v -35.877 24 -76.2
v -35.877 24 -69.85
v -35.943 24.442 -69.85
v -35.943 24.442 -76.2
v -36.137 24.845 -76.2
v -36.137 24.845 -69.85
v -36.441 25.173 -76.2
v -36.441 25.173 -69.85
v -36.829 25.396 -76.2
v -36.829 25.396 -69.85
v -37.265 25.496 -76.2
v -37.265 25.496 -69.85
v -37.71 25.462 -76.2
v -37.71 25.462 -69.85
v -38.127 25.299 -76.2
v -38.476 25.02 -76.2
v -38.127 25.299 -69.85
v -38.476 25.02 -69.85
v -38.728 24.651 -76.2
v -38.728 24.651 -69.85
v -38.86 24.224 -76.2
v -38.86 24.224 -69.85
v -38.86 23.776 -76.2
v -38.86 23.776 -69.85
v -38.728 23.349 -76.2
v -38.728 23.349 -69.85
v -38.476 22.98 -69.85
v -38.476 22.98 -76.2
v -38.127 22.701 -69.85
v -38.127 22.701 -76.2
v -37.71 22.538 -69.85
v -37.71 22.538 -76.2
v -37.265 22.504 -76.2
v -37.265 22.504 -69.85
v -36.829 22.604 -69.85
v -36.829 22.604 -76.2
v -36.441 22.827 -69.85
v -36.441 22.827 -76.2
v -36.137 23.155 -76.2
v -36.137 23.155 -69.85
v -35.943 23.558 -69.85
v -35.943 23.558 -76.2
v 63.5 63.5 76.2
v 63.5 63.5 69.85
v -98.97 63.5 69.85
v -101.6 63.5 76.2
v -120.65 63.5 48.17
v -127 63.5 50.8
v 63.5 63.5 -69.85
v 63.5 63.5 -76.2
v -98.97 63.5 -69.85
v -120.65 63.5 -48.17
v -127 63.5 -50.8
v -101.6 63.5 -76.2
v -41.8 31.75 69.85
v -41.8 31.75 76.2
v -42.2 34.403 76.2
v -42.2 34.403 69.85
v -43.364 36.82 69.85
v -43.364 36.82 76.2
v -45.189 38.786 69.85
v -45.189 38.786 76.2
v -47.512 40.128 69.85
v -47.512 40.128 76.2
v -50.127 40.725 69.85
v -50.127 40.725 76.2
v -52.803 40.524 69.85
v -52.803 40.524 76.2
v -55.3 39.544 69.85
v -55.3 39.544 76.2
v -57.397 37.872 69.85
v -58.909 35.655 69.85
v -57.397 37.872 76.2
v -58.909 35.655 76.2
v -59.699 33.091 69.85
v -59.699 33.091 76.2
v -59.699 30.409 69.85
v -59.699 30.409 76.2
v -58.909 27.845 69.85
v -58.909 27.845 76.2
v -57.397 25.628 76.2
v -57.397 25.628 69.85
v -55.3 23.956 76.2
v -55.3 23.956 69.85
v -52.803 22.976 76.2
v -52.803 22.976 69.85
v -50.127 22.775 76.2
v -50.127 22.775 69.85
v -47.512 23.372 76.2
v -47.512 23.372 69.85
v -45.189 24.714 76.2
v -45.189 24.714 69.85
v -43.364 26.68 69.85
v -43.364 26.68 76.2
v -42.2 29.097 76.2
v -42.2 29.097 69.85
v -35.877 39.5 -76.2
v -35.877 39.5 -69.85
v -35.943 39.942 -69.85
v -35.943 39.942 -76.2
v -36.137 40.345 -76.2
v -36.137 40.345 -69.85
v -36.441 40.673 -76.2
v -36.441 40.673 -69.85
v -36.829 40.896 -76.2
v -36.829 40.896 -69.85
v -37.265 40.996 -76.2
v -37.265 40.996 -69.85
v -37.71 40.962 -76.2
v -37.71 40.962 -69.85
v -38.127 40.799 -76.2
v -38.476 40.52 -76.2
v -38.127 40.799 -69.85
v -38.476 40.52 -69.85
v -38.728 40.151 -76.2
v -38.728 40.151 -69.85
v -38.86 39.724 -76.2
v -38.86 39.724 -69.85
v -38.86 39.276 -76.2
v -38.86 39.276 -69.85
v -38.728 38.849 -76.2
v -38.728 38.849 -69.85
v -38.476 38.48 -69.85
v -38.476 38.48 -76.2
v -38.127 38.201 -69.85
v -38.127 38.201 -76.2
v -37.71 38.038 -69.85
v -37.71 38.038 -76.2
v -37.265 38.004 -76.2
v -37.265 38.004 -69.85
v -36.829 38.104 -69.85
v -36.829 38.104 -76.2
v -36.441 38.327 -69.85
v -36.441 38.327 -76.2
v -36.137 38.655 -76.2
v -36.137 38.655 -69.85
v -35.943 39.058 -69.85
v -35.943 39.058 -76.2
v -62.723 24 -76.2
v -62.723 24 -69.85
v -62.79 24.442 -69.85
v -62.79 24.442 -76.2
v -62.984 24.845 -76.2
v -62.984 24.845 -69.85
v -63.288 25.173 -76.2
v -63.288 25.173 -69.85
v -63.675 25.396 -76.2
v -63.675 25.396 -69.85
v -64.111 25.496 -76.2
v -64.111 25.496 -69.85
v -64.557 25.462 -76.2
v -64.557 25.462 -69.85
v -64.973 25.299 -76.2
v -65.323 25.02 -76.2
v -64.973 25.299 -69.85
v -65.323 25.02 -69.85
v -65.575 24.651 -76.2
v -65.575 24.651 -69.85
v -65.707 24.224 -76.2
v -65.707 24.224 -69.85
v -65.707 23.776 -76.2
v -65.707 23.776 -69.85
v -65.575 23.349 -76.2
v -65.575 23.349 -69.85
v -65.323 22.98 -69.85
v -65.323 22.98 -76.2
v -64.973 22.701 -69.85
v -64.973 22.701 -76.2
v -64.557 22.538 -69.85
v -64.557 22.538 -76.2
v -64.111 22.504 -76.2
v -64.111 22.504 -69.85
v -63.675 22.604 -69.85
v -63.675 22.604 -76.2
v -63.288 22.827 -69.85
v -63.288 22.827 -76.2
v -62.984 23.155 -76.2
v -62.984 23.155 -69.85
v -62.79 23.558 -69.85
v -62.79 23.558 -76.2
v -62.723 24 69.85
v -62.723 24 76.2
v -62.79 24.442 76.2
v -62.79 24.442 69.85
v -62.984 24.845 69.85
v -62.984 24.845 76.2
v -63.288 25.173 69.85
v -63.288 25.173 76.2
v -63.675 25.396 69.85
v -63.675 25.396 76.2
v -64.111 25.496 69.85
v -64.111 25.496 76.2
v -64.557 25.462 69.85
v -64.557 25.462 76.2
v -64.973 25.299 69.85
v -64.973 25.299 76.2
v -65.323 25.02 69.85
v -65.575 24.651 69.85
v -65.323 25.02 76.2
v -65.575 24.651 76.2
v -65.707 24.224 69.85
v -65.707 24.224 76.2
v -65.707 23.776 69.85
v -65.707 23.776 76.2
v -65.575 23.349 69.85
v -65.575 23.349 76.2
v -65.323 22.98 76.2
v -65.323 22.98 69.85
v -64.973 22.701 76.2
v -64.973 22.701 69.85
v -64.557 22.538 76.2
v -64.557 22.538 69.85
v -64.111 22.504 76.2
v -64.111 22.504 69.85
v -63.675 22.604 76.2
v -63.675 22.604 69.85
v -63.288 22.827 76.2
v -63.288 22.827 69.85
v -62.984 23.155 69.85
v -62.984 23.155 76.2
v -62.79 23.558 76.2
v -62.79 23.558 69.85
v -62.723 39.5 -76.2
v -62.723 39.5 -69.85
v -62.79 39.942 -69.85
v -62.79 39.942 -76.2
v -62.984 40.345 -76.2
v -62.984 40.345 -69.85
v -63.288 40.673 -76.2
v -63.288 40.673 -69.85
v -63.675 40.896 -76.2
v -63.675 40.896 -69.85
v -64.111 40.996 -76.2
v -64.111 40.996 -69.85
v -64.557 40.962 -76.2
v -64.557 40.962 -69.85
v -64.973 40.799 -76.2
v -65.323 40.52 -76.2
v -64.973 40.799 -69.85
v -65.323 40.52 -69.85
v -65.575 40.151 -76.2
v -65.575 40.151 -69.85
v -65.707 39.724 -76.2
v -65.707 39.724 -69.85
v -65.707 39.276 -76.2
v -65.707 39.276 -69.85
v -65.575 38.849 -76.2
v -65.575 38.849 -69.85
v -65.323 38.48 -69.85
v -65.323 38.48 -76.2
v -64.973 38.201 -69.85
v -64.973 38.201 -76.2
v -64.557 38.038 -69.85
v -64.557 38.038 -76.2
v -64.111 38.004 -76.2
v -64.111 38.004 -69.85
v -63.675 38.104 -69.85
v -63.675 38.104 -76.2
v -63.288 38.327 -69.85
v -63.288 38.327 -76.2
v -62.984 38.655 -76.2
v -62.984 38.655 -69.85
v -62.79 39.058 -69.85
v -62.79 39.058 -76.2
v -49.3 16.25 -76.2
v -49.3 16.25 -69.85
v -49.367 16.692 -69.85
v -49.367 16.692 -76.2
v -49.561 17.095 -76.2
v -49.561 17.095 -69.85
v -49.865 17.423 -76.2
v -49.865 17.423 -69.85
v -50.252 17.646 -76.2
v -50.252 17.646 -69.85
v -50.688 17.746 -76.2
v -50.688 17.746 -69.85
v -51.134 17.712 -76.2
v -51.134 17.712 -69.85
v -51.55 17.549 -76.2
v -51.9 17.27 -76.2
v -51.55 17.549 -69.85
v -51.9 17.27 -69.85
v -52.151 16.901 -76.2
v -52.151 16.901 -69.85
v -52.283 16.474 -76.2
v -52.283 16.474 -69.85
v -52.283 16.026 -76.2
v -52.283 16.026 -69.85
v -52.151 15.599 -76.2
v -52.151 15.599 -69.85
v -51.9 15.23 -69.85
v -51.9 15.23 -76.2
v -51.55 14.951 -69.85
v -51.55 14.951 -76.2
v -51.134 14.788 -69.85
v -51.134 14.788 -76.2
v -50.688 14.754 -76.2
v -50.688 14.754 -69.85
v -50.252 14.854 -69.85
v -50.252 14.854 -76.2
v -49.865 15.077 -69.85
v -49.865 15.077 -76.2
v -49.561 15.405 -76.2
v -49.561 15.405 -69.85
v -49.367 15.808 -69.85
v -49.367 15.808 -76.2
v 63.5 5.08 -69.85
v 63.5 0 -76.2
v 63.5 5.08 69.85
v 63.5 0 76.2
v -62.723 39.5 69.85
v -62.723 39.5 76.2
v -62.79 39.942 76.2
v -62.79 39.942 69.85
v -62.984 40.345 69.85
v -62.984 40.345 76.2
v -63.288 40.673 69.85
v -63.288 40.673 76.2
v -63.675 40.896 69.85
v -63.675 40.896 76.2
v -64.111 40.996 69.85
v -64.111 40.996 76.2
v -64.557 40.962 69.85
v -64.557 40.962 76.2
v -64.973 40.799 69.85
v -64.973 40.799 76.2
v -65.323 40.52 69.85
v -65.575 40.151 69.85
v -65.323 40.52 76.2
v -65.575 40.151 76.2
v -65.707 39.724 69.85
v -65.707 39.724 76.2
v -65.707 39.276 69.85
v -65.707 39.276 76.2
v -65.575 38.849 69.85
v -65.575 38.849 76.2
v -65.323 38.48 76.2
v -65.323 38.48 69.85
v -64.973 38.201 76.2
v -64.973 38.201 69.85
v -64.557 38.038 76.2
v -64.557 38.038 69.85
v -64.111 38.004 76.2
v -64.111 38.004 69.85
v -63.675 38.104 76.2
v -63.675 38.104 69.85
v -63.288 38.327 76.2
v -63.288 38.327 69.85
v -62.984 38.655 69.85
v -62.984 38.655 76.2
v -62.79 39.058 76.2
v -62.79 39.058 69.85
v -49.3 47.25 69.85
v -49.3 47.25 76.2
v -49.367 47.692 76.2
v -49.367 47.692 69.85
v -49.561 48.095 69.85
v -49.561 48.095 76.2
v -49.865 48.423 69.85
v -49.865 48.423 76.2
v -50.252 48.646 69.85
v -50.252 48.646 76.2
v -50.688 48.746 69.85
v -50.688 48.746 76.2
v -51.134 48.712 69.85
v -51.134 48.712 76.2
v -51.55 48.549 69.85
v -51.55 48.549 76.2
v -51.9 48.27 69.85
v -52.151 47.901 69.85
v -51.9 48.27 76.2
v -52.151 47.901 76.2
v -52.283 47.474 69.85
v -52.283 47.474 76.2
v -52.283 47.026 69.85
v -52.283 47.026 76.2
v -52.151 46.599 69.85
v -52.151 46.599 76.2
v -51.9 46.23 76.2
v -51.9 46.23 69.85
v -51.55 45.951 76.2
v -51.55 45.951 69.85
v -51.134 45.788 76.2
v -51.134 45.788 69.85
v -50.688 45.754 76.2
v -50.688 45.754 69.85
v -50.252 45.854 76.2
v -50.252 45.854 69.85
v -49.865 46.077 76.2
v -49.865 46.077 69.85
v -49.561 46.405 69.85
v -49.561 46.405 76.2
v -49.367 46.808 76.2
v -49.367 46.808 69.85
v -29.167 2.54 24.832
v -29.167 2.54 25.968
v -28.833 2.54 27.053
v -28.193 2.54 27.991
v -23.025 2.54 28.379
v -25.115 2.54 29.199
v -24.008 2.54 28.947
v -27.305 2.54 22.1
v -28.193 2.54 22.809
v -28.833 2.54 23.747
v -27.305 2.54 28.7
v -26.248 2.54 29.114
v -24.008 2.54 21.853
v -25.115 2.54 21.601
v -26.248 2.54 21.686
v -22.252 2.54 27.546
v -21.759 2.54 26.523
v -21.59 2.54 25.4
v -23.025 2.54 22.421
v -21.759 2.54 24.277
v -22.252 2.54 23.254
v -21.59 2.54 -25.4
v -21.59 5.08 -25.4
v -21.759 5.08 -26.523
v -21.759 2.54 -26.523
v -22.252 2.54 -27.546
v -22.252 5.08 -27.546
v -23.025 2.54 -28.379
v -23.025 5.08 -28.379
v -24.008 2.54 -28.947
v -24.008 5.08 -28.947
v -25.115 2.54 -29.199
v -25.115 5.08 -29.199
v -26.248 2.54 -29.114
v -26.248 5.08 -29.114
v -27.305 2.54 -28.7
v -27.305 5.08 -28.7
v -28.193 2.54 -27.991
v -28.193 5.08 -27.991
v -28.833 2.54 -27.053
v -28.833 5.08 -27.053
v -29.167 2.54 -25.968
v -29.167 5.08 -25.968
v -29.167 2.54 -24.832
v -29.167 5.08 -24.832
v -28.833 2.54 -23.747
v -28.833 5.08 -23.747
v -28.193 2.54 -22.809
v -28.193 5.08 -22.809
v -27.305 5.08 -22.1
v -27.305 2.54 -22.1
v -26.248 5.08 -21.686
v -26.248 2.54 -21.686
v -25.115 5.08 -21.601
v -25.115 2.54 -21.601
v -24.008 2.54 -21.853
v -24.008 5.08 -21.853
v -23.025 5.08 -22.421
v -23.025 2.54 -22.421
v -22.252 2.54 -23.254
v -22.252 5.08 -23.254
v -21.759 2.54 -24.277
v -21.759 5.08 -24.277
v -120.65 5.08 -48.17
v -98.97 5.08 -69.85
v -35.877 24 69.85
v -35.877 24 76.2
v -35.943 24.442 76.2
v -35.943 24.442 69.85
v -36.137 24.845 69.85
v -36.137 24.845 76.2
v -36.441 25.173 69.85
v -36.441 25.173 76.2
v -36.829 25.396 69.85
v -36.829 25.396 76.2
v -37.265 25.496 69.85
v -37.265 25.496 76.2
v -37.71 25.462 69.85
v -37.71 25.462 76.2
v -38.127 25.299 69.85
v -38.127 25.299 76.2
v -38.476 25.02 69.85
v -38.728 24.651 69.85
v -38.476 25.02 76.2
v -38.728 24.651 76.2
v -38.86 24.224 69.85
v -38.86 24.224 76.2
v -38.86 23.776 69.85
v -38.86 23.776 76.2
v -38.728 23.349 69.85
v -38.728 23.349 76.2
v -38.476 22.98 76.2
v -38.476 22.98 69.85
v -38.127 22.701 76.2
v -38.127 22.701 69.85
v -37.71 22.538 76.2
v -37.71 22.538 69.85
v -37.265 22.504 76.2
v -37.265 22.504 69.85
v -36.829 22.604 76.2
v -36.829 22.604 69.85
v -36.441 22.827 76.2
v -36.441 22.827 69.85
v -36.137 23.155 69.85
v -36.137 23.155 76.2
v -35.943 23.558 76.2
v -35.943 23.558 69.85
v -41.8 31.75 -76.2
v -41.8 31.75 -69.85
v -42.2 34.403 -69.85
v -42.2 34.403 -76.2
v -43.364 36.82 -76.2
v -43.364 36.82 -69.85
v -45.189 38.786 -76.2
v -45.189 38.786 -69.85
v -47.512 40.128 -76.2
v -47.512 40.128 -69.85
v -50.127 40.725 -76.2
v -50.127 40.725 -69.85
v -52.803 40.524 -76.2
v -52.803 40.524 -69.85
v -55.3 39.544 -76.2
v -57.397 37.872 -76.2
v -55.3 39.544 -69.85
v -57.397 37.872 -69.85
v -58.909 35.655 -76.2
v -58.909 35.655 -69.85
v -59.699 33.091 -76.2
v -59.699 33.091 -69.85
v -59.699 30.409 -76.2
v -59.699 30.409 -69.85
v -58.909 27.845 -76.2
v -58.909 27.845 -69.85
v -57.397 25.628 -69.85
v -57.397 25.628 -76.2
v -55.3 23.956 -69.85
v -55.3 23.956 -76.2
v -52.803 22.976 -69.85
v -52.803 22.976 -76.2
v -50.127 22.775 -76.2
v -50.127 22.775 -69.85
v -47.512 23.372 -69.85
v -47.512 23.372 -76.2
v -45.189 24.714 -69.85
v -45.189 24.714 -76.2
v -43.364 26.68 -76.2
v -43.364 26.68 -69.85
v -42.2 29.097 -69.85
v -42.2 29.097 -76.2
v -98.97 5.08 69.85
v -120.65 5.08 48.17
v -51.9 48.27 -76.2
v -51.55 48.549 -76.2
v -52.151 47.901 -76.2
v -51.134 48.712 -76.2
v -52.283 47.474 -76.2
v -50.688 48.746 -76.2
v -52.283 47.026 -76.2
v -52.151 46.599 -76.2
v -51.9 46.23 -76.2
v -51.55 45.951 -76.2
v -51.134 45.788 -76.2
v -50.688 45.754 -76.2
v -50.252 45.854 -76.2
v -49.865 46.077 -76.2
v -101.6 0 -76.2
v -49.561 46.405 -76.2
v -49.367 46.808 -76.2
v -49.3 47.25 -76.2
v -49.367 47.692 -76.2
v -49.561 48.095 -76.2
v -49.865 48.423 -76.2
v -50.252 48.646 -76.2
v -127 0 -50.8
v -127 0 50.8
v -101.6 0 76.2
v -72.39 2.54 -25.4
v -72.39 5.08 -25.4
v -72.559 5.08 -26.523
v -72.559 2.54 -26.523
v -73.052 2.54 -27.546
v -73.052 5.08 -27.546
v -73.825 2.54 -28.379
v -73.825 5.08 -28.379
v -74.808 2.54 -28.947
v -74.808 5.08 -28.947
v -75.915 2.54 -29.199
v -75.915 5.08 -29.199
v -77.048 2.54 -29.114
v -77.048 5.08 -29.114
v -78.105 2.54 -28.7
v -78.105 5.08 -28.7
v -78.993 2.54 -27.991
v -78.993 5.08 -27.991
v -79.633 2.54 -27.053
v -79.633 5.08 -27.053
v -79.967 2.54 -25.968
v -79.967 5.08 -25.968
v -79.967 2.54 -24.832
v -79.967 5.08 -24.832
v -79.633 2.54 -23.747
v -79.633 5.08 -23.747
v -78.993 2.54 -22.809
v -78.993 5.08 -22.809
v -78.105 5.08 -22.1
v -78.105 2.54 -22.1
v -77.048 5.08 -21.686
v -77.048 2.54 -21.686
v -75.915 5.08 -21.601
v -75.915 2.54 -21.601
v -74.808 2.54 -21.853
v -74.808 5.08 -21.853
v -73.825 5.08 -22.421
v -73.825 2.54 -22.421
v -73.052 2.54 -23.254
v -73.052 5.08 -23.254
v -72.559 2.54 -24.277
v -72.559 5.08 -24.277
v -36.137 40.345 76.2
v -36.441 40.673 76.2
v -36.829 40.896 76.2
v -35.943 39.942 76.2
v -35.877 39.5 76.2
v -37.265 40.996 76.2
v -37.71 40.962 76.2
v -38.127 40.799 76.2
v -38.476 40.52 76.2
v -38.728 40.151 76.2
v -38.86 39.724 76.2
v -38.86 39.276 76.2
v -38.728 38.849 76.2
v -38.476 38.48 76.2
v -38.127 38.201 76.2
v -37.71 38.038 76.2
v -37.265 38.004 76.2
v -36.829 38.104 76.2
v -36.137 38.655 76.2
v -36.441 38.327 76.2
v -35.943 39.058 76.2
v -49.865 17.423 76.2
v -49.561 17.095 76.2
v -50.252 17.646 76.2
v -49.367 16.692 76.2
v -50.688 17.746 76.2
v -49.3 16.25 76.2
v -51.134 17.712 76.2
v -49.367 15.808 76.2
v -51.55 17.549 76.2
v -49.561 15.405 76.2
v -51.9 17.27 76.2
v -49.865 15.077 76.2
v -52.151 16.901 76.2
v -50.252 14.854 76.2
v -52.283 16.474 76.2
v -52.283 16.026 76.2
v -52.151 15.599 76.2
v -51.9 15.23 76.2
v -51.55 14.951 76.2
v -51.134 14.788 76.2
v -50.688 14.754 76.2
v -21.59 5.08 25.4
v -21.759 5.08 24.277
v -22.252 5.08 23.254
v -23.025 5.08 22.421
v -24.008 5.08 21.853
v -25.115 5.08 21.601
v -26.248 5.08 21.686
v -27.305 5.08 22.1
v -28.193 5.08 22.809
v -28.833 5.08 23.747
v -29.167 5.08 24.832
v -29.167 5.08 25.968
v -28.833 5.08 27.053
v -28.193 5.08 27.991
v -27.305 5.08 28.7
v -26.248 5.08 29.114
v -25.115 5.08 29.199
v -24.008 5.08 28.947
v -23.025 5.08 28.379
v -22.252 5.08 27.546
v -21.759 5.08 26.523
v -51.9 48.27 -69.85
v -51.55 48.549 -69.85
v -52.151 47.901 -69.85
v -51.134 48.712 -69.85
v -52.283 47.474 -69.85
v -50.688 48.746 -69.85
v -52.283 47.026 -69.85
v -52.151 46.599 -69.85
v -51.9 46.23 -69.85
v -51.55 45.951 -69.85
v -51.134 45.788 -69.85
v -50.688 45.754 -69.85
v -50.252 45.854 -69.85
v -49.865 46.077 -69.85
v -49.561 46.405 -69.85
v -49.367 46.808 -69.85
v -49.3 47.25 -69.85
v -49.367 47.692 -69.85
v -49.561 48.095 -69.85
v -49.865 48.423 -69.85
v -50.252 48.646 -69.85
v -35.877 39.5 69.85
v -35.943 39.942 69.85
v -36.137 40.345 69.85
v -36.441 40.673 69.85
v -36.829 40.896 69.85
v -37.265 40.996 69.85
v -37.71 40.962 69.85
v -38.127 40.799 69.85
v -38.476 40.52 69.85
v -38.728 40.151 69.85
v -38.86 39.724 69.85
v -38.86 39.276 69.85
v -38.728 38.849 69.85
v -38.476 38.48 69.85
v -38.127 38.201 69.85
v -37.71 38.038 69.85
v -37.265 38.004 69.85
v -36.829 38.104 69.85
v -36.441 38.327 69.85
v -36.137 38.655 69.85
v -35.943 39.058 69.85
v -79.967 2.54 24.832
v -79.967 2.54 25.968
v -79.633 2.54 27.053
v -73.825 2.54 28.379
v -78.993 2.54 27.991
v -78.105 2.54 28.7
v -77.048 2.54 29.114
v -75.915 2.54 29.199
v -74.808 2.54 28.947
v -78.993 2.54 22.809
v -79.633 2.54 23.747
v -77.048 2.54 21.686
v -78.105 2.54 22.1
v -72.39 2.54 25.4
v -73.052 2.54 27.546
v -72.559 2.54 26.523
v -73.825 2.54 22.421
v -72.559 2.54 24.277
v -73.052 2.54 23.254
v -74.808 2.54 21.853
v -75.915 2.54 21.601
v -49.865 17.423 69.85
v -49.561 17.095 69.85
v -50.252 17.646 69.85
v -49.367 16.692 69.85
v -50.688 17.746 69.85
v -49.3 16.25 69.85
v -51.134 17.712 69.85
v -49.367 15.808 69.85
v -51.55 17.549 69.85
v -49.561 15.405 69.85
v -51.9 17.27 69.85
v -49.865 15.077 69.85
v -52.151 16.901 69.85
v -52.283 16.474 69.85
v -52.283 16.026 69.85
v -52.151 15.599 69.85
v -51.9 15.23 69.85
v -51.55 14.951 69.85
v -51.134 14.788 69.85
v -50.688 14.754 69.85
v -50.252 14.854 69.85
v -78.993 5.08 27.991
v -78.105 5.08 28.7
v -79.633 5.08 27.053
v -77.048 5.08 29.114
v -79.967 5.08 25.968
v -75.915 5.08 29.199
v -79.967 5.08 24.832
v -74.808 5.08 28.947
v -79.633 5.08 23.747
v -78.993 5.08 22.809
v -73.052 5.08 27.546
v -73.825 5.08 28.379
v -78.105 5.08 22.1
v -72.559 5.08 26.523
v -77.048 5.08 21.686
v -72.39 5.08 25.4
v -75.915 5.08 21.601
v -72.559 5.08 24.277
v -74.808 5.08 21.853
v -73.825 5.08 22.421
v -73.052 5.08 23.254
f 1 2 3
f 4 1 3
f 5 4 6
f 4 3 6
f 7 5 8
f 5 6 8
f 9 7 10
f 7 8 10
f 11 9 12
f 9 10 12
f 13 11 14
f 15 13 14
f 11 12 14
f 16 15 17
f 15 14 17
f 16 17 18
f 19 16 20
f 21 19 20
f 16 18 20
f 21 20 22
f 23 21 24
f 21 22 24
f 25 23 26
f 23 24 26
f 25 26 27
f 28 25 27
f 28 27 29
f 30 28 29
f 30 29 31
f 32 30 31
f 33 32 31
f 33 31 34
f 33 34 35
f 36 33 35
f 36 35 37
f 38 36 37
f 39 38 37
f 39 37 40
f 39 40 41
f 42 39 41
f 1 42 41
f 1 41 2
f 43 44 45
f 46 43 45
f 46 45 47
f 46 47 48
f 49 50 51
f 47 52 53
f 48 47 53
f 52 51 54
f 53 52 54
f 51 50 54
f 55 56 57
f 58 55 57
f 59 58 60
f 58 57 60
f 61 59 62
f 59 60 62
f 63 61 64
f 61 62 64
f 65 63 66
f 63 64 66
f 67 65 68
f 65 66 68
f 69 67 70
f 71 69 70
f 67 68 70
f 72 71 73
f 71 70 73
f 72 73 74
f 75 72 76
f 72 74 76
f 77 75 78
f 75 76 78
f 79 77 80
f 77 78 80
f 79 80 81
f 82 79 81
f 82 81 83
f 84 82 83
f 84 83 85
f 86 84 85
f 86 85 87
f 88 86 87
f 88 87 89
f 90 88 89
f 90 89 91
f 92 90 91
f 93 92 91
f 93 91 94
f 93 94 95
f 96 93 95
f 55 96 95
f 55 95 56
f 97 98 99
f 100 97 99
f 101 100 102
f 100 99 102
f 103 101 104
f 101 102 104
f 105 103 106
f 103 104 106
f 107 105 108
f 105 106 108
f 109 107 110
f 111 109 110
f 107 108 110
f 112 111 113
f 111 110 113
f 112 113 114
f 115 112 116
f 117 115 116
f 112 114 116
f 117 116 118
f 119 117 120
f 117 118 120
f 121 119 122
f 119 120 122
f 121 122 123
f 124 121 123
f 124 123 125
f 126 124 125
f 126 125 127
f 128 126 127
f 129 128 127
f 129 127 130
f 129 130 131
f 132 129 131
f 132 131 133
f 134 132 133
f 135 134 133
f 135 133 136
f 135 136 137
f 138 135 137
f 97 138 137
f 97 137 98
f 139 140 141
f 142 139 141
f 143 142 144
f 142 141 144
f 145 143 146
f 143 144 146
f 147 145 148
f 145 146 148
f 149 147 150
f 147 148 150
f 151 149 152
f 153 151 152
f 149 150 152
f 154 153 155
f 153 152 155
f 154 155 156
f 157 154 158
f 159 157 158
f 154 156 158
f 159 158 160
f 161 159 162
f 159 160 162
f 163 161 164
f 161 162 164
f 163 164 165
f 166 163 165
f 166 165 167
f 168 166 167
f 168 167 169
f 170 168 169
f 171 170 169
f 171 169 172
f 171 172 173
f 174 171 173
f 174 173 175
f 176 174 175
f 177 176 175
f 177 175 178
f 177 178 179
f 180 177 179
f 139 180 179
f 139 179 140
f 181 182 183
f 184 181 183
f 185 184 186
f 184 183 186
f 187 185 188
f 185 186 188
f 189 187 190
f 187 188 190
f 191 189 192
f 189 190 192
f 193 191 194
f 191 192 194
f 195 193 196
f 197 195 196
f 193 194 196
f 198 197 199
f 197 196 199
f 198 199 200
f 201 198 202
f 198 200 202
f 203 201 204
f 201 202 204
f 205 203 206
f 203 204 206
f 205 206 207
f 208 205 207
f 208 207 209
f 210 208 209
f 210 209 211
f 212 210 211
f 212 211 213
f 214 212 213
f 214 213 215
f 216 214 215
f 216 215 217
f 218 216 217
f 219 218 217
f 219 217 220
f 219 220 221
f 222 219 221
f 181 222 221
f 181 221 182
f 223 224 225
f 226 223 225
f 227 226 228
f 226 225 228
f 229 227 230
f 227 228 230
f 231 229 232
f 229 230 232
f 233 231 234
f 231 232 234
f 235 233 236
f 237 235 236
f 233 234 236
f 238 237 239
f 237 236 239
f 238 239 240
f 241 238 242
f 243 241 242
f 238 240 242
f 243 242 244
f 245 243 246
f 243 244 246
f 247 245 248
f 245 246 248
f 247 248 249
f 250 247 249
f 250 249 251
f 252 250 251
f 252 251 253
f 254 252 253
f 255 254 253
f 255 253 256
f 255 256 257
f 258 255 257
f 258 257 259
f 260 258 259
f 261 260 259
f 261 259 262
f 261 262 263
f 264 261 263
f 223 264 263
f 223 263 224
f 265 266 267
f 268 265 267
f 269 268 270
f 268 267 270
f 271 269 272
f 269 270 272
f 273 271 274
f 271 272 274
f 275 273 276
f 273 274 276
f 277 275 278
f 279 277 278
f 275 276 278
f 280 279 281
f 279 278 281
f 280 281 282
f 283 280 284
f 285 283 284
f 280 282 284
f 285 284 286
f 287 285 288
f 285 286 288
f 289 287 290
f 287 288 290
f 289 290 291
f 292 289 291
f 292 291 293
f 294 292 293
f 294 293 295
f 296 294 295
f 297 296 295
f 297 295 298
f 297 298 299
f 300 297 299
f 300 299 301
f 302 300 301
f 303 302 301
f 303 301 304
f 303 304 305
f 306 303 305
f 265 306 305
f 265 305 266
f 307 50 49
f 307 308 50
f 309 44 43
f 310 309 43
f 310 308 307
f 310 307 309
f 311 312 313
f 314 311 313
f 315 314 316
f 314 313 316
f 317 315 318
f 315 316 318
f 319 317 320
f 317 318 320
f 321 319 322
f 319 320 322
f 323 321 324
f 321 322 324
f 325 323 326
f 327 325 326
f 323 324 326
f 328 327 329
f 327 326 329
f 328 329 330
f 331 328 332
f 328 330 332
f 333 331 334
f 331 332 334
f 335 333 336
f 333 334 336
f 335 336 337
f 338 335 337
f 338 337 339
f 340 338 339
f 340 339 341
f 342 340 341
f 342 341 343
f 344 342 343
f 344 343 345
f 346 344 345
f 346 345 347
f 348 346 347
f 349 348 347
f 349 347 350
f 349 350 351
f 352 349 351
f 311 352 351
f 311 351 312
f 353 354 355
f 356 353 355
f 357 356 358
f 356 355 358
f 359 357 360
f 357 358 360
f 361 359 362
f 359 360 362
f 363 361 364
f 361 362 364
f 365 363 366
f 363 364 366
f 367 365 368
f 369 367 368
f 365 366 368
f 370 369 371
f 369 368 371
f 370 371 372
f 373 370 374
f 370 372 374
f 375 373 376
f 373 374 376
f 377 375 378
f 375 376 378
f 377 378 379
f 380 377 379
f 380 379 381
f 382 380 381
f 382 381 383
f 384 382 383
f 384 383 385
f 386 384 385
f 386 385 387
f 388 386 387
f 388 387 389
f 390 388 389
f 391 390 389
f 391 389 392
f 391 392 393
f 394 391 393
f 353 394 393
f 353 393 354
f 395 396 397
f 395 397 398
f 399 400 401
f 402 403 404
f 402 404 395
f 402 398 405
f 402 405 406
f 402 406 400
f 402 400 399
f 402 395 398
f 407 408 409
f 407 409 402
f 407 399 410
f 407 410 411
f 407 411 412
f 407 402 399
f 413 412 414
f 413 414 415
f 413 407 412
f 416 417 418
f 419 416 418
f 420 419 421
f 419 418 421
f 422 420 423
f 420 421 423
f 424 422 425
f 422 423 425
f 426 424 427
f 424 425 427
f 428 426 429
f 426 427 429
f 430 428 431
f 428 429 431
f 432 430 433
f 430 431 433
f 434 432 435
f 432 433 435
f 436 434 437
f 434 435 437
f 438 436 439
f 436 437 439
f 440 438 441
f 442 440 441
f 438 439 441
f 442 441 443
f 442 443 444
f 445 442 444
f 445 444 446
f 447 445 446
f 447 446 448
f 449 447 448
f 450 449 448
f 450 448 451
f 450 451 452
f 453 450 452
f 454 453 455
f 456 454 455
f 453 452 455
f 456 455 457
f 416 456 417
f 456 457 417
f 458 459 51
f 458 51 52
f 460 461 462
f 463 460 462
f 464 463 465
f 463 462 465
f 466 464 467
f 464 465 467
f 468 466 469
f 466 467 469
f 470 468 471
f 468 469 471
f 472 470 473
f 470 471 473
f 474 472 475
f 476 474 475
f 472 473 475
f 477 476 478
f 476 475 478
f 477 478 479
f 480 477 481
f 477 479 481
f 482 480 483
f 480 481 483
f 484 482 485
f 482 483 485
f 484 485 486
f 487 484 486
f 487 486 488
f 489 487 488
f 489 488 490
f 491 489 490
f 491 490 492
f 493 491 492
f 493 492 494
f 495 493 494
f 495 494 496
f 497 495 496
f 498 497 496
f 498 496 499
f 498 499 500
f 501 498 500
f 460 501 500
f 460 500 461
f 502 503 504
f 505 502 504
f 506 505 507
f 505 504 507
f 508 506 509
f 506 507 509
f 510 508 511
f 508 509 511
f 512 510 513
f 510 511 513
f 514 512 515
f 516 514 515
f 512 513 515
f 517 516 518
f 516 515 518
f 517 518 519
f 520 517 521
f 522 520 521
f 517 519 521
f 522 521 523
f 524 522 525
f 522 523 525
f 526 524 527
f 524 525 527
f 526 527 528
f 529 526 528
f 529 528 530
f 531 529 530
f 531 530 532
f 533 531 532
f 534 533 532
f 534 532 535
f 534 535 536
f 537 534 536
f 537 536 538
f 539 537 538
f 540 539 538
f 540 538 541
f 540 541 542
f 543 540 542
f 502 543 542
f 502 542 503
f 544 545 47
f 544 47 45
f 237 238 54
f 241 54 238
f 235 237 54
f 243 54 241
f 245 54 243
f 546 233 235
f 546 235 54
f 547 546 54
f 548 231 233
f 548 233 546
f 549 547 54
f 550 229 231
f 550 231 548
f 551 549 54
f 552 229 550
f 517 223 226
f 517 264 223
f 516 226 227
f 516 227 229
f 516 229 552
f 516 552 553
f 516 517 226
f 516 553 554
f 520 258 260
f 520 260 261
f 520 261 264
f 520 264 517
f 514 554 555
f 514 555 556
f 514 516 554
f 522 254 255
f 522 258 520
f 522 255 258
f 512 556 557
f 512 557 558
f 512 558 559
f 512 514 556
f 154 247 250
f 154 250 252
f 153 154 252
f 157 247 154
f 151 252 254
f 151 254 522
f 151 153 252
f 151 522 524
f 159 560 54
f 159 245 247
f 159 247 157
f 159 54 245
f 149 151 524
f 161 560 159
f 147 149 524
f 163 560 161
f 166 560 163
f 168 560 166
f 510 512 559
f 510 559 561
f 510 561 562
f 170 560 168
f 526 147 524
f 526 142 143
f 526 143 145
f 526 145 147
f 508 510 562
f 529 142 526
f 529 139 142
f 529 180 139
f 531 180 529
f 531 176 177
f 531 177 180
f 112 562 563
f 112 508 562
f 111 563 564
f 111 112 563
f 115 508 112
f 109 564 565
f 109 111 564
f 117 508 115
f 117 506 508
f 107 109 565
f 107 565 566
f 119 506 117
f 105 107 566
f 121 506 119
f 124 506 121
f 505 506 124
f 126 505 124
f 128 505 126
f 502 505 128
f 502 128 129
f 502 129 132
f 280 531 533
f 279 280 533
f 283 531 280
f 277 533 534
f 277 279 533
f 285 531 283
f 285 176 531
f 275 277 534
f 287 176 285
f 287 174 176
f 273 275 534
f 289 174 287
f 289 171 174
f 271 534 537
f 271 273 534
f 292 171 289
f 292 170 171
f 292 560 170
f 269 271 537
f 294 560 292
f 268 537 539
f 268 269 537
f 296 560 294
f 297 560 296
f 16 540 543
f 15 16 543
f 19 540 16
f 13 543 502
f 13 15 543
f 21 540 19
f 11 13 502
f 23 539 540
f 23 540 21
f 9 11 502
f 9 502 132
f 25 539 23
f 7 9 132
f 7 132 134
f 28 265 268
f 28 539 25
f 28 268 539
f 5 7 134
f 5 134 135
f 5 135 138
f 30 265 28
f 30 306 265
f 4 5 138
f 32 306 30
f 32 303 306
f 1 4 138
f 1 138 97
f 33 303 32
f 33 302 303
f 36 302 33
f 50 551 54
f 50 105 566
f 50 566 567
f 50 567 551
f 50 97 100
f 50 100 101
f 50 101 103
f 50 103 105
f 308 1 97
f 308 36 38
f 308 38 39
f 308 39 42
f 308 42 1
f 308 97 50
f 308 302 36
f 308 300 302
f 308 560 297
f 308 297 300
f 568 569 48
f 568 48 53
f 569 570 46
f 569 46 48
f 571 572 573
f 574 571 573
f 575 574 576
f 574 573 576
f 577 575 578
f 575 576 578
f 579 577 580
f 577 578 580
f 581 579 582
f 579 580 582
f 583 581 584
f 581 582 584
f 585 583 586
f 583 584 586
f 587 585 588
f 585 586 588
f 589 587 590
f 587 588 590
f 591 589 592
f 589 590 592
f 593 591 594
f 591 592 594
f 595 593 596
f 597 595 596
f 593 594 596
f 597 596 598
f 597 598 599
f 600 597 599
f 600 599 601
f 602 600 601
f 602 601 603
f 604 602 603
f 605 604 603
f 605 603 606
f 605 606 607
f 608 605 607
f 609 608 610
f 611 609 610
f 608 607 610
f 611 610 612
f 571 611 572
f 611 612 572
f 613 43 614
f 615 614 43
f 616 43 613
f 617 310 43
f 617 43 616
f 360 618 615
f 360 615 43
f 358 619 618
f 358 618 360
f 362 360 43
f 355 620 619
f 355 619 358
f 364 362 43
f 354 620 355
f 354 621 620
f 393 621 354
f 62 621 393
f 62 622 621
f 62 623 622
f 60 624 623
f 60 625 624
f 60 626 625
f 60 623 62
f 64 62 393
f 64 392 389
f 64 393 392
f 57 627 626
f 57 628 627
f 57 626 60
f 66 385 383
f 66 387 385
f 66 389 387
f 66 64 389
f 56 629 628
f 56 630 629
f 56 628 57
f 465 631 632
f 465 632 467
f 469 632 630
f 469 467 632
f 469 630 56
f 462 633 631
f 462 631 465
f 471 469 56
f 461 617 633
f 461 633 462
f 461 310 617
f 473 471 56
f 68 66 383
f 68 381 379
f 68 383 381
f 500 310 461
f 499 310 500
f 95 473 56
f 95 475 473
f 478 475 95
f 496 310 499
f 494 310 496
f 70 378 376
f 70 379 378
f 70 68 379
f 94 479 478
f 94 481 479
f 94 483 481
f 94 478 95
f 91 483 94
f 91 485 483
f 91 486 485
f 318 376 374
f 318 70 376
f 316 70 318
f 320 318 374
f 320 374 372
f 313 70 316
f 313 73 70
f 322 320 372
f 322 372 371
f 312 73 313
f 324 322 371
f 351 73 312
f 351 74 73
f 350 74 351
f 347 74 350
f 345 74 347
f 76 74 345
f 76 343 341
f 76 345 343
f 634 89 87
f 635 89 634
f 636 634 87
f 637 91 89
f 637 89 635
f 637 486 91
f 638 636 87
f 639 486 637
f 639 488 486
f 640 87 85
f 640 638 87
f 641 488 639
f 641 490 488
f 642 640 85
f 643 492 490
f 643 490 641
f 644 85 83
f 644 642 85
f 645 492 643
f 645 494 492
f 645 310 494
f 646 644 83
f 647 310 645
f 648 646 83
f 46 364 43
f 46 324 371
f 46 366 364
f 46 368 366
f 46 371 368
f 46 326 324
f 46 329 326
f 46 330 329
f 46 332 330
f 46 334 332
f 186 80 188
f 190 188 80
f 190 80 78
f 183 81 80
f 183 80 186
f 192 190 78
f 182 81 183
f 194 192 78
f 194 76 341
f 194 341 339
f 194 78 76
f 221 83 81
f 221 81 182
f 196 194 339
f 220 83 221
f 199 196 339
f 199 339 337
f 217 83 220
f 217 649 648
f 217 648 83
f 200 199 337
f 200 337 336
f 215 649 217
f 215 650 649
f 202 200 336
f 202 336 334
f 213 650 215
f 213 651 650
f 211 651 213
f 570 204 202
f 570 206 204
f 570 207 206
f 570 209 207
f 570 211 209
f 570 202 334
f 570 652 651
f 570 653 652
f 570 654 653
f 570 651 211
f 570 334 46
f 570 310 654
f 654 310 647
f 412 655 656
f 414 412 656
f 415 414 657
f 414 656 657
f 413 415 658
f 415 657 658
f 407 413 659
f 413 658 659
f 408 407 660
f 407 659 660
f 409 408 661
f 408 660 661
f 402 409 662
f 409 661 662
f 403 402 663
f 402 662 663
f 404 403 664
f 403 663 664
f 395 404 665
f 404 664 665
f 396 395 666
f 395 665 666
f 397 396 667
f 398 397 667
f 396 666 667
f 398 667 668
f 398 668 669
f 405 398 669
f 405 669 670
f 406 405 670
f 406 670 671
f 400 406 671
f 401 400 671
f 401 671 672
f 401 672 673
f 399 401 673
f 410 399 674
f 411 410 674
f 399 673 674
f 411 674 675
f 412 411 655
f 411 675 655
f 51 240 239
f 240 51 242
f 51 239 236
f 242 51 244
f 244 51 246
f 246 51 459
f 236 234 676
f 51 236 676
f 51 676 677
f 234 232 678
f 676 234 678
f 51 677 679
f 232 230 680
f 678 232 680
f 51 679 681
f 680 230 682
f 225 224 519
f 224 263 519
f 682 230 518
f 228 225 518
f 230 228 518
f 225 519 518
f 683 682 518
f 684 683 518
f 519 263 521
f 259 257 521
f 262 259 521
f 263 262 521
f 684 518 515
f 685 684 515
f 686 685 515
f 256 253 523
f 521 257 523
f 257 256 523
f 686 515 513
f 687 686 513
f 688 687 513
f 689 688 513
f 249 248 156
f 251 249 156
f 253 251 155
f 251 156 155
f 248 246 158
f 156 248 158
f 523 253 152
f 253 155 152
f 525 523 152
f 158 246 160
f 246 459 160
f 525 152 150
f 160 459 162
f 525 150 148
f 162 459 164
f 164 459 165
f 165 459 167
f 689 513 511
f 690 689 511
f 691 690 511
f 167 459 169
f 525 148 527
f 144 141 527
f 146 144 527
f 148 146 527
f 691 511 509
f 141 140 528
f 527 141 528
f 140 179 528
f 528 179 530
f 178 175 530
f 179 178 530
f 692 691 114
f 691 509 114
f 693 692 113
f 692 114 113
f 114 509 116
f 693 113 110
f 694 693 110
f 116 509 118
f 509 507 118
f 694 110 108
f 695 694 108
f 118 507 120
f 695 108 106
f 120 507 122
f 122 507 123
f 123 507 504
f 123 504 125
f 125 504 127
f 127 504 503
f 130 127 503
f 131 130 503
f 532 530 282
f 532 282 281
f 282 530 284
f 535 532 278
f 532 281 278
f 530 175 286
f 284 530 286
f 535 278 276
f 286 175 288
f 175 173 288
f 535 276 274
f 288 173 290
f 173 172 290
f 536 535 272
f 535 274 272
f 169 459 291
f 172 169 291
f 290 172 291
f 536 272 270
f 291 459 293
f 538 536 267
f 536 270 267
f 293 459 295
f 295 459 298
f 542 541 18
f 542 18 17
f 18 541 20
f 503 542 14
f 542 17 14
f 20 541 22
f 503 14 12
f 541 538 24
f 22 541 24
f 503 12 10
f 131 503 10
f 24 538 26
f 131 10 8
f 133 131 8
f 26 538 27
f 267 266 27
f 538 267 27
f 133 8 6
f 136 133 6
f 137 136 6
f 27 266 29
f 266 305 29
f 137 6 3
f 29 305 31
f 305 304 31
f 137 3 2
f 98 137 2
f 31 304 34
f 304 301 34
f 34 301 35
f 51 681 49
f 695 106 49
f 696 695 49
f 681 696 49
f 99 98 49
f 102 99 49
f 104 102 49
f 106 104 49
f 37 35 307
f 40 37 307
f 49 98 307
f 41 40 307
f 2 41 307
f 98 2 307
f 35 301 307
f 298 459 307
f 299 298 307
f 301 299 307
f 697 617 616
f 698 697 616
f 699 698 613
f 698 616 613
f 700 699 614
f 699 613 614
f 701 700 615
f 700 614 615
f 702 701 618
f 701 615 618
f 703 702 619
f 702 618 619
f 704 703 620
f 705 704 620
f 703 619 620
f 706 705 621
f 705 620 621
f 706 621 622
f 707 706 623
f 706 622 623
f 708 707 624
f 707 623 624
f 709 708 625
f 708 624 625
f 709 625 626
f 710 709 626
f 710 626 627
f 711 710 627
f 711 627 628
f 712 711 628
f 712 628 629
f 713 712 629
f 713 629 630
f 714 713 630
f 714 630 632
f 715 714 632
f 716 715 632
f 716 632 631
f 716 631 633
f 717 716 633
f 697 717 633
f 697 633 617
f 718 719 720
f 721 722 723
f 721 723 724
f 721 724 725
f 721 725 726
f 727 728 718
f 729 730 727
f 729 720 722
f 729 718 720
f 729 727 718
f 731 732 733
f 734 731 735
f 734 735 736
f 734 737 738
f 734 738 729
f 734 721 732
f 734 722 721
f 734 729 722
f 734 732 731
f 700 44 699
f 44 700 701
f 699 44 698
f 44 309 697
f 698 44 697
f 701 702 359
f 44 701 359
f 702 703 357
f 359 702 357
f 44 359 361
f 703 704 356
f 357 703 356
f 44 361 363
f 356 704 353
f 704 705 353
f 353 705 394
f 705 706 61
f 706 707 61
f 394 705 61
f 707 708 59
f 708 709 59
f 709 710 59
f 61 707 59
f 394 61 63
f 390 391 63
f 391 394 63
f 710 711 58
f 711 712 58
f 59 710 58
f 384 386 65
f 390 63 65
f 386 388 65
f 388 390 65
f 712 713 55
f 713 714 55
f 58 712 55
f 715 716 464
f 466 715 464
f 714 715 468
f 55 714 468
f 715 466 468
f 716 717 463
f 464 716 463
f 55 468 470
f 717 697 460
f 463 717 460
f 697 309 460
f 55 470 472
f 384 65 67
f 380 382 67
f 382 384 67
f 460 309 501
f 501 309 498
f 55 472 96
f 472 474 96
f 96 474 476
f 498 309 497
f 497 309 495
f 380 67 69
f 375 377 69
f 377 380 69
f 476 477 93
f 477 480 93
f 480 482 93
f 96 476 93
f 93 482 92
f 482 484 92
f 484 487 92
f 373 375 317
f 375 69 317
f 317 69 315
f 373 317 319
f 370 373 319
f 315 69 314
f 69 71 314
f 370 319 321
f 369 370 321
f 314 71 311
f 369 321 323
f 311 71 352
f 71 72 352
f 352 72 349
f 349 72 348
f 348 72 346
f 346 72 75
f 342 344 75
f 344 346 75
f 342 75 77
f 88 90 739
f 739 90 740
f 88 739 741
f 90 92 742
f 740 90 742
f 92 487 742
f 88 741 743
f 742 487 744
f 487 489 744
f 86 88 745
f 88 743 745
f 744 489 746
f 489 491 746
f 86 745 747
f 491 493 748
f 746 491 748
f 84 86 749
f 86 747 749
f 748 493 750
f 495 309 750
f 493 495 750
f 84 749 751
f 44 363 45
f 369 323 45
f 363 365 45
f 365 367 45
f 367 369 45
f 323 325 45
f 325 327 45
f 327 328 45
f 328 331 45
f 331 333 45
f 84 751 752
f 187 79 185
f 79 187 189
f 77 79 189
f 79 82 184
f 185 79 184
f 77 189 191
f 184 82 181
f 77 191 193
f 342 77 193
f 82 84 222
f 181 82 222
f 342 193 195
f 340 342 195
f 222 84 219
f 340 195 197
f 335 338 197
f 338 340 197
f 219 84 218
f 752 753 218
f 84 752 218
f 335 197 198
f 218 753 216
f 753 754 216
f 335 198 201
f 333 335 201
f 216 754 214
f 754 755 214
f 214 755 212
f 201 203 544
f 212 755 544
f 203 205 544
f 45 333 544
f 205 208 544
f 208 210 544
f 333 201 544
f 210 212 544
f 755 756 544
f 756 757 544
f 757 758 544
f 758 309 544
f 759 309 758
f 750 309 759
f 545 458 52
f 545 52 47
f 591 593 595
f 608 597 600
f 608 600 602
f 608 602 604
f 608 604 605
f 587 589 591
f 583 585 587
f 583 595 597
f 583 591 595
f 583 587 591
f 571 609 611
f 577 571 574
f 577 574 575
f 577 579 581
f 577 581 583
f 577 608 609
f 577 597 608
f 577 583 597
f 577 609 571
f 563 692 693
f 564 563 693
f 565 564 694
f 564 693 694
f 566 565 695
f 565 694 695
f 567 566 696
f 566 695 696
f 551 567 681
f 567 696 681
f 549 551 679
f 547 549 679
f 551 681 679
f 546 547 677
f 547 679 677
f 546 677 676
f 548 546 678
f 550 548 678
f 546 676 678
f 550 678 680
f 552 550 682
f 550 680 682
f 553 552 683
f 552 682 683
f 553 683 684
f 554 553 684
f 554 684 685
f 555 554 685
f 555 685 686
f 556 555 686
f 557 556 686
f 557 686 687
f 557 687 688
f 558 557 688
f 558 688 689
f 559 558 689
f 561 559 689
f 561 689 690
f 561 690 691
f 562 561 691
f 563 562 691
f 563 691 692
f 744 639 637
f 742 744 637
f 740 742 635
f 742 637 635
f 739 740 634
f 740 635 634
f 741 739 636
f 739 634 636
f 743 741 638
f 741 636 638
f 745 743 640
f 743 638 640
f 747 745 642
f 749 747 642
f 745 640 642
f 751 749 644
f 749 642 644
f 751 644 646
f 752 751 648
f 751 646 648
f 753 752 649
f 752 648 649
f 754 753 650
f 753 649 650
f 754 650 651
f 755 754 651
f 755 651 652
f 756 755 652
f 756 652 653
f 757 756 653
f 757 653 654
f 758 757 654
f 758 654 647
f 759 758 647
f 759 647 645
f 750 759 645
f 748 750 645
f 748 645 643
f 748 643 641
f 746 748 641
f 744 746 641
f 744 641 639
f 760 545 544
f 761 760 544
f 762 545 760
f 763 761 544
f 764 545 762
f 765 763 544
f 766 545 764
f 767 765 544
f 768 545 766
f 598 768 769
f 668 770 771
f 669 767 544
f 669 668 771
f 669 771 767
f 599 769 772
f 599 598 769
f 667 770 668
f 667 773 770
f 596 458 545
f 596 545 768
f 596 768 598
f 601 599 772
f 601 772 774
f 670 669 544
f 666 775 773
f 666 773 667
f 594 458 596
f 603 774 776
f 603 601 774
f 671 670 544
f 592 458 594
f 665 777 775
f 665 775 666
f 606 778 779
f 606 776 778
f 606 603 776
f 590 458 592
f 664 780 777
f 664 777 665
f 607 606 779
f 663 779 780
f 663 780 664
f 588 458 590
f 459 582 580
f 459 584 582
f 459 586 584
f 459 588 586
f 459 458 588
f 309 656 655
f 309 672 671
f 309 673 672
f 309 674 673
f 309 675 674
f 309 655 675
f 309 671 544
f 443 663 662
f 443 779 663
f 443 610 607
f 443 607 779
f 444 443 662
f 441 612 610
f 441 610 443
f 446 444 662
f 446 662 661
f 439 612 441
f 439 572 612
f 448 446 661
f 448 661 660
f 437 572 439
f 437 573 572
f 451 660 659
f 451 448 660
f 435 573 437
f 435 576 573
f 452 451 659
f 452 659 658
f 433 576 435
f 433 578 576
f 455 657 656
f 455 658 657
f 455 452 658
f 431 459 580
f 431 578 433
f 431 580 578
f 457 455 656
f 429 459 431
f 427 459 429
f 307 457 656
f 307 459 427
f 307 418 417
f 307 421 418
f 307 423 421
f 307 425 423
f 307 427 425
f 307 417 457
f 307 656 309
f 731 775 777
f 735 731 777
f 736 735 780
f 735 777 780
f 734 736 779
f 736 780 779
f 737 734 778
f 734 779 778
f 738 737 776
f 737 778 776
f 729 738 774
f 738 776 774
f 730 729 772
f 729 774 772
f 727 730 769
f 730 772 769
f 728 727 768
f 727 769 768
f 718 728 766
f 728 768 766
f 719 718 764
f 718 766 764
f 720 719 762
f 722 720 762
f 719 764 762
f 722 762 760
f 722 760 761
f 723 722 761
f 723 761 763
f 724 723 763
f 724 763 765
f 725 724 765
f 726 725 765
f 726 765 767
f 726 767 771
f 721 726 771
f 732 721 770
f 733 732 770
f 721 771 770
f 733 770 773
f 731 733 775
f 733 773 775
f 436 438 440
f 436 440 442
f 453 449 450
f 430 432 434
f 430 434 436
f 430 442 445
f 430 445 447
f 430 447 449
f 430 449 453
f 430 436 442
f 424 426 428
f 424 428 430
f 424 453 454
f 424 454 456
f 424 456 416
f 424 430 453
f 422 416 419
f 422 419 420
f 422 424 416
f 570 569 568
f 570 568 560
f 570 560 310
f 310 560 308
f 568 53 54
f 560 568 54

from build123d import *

# Parameters (mm, degrees)
SKETCH2_W           = 190.5
SKETCH2_H           = 152.4
BOSS_EXTRUDE1_DEPTH = 5.08
CHAMFER1_SIZE       = 25.4
BOSS_EXTRUDE3_DEPTH = 58.42
SKETCH5_R           = 9
SKETCH5_R_2         = 1.5
CUT_EXTRUDE1_DEPTH  = 153.4
SKETCH7_R           = 3.81
CUT_EXTRUDE2_DEPTH  = 2.54


with BuildPart() as part:
    # Sketch2 → Boss-Extrude1 (new body)
    with BuildSketch(Plane(origin=(0, 0, 0), x_dir=(1, 0, 0), z_dir=(0, 1, 0))):
        with Locations((-31.75, 0)):
            Rectangle(SKETCH2_W, SKETCH2_H)
    extrude(amount=BOSS_EXTRUDE1_DEPTH)

    # Chamfer1
    chamfer1_edges = [part.edges().sort_by_distance(p)[0] for p in [
        (-127, 2.54, -76.2),
        (-127, 2.54, 76.2),
    ]]
    chamfer(chamfer1_edges, length=CHAMFER1_SIZE)

    # Sketch4 → Boss-Extrude3 (add)
    with BuildSketch(Plane(origin=(0, 5.08, 0), x_dir=(1, 0, 0), z_dir=(0, 1, 0))):
        Polygon((57.15, 69.85), (-98.969743879, 69.85), (-120.65, 48.169743879), (-120.65, -48.169743879), (-98.969743879, -69.85), (57.15, -69.85), (63.5, -69.85), (63.5, -76.2), (-101.6, -76.2), (-127, -50.8), (-127, 50.8), (-101.6, 76.2), (63.5, 76.2), (63.5, 69.85), align=None)
    extrude(amount=BOSS_EXTRUDE3_DEPTH)

    # Sketch5 → Cut-Extrude1 (cut, through all)
    with BuildSketch(Plane.XY.offset(76.2)):
        with Locations((-50.8, 31.75)):
            Circle(SKETCH5_R)
        with Locations((-50.8, 47.25)):
            Circle(SKETCH5_R_2)
        with Locations((-37.376606241, 39.5)):
            Circle(SKETCH5_R_2)
        with Locations((-37.376606241, 24)):
            Circle(SKETCH5_R_2)
        with Locations((-50.8, 16.25)):
            Circle(SKETCH5_R_2)
        with Locations((-64.223393759, 24)):
            Circle(SKETCH5_R_2)
        with Locations((-64.223393759, 39.5)):
            Circle(SKETCH5_R_2)
    extrude(amount=-CUT_EXTRUDE1_DEPTH, mode=Mode.SUBTRACT)

    # Sketch7 → Cut-Extrude2 (cut)
    with BuildSketch(Plane(origin=(0, 5.08, 0), x_dir=(1, 0, 0), z_dir=(0, 1, 0))):
        with Locations((-76.2, 25.4)):
            Circle(SKETCH7_R)
        with Locations((-25.4, 25.4)):
            Circle(SKETCH7_R)
        with Locations((-25.4, -25.4)):
            Circle(SKETCH7_R)
        with Locations((-76.2, -25.4)):
            Circle(SKETCH7_R)
    extrude(amount=-CUT_EXTRUDE2_DEPTH, mode=Mode.SUBTRACT)


solid = part.part
